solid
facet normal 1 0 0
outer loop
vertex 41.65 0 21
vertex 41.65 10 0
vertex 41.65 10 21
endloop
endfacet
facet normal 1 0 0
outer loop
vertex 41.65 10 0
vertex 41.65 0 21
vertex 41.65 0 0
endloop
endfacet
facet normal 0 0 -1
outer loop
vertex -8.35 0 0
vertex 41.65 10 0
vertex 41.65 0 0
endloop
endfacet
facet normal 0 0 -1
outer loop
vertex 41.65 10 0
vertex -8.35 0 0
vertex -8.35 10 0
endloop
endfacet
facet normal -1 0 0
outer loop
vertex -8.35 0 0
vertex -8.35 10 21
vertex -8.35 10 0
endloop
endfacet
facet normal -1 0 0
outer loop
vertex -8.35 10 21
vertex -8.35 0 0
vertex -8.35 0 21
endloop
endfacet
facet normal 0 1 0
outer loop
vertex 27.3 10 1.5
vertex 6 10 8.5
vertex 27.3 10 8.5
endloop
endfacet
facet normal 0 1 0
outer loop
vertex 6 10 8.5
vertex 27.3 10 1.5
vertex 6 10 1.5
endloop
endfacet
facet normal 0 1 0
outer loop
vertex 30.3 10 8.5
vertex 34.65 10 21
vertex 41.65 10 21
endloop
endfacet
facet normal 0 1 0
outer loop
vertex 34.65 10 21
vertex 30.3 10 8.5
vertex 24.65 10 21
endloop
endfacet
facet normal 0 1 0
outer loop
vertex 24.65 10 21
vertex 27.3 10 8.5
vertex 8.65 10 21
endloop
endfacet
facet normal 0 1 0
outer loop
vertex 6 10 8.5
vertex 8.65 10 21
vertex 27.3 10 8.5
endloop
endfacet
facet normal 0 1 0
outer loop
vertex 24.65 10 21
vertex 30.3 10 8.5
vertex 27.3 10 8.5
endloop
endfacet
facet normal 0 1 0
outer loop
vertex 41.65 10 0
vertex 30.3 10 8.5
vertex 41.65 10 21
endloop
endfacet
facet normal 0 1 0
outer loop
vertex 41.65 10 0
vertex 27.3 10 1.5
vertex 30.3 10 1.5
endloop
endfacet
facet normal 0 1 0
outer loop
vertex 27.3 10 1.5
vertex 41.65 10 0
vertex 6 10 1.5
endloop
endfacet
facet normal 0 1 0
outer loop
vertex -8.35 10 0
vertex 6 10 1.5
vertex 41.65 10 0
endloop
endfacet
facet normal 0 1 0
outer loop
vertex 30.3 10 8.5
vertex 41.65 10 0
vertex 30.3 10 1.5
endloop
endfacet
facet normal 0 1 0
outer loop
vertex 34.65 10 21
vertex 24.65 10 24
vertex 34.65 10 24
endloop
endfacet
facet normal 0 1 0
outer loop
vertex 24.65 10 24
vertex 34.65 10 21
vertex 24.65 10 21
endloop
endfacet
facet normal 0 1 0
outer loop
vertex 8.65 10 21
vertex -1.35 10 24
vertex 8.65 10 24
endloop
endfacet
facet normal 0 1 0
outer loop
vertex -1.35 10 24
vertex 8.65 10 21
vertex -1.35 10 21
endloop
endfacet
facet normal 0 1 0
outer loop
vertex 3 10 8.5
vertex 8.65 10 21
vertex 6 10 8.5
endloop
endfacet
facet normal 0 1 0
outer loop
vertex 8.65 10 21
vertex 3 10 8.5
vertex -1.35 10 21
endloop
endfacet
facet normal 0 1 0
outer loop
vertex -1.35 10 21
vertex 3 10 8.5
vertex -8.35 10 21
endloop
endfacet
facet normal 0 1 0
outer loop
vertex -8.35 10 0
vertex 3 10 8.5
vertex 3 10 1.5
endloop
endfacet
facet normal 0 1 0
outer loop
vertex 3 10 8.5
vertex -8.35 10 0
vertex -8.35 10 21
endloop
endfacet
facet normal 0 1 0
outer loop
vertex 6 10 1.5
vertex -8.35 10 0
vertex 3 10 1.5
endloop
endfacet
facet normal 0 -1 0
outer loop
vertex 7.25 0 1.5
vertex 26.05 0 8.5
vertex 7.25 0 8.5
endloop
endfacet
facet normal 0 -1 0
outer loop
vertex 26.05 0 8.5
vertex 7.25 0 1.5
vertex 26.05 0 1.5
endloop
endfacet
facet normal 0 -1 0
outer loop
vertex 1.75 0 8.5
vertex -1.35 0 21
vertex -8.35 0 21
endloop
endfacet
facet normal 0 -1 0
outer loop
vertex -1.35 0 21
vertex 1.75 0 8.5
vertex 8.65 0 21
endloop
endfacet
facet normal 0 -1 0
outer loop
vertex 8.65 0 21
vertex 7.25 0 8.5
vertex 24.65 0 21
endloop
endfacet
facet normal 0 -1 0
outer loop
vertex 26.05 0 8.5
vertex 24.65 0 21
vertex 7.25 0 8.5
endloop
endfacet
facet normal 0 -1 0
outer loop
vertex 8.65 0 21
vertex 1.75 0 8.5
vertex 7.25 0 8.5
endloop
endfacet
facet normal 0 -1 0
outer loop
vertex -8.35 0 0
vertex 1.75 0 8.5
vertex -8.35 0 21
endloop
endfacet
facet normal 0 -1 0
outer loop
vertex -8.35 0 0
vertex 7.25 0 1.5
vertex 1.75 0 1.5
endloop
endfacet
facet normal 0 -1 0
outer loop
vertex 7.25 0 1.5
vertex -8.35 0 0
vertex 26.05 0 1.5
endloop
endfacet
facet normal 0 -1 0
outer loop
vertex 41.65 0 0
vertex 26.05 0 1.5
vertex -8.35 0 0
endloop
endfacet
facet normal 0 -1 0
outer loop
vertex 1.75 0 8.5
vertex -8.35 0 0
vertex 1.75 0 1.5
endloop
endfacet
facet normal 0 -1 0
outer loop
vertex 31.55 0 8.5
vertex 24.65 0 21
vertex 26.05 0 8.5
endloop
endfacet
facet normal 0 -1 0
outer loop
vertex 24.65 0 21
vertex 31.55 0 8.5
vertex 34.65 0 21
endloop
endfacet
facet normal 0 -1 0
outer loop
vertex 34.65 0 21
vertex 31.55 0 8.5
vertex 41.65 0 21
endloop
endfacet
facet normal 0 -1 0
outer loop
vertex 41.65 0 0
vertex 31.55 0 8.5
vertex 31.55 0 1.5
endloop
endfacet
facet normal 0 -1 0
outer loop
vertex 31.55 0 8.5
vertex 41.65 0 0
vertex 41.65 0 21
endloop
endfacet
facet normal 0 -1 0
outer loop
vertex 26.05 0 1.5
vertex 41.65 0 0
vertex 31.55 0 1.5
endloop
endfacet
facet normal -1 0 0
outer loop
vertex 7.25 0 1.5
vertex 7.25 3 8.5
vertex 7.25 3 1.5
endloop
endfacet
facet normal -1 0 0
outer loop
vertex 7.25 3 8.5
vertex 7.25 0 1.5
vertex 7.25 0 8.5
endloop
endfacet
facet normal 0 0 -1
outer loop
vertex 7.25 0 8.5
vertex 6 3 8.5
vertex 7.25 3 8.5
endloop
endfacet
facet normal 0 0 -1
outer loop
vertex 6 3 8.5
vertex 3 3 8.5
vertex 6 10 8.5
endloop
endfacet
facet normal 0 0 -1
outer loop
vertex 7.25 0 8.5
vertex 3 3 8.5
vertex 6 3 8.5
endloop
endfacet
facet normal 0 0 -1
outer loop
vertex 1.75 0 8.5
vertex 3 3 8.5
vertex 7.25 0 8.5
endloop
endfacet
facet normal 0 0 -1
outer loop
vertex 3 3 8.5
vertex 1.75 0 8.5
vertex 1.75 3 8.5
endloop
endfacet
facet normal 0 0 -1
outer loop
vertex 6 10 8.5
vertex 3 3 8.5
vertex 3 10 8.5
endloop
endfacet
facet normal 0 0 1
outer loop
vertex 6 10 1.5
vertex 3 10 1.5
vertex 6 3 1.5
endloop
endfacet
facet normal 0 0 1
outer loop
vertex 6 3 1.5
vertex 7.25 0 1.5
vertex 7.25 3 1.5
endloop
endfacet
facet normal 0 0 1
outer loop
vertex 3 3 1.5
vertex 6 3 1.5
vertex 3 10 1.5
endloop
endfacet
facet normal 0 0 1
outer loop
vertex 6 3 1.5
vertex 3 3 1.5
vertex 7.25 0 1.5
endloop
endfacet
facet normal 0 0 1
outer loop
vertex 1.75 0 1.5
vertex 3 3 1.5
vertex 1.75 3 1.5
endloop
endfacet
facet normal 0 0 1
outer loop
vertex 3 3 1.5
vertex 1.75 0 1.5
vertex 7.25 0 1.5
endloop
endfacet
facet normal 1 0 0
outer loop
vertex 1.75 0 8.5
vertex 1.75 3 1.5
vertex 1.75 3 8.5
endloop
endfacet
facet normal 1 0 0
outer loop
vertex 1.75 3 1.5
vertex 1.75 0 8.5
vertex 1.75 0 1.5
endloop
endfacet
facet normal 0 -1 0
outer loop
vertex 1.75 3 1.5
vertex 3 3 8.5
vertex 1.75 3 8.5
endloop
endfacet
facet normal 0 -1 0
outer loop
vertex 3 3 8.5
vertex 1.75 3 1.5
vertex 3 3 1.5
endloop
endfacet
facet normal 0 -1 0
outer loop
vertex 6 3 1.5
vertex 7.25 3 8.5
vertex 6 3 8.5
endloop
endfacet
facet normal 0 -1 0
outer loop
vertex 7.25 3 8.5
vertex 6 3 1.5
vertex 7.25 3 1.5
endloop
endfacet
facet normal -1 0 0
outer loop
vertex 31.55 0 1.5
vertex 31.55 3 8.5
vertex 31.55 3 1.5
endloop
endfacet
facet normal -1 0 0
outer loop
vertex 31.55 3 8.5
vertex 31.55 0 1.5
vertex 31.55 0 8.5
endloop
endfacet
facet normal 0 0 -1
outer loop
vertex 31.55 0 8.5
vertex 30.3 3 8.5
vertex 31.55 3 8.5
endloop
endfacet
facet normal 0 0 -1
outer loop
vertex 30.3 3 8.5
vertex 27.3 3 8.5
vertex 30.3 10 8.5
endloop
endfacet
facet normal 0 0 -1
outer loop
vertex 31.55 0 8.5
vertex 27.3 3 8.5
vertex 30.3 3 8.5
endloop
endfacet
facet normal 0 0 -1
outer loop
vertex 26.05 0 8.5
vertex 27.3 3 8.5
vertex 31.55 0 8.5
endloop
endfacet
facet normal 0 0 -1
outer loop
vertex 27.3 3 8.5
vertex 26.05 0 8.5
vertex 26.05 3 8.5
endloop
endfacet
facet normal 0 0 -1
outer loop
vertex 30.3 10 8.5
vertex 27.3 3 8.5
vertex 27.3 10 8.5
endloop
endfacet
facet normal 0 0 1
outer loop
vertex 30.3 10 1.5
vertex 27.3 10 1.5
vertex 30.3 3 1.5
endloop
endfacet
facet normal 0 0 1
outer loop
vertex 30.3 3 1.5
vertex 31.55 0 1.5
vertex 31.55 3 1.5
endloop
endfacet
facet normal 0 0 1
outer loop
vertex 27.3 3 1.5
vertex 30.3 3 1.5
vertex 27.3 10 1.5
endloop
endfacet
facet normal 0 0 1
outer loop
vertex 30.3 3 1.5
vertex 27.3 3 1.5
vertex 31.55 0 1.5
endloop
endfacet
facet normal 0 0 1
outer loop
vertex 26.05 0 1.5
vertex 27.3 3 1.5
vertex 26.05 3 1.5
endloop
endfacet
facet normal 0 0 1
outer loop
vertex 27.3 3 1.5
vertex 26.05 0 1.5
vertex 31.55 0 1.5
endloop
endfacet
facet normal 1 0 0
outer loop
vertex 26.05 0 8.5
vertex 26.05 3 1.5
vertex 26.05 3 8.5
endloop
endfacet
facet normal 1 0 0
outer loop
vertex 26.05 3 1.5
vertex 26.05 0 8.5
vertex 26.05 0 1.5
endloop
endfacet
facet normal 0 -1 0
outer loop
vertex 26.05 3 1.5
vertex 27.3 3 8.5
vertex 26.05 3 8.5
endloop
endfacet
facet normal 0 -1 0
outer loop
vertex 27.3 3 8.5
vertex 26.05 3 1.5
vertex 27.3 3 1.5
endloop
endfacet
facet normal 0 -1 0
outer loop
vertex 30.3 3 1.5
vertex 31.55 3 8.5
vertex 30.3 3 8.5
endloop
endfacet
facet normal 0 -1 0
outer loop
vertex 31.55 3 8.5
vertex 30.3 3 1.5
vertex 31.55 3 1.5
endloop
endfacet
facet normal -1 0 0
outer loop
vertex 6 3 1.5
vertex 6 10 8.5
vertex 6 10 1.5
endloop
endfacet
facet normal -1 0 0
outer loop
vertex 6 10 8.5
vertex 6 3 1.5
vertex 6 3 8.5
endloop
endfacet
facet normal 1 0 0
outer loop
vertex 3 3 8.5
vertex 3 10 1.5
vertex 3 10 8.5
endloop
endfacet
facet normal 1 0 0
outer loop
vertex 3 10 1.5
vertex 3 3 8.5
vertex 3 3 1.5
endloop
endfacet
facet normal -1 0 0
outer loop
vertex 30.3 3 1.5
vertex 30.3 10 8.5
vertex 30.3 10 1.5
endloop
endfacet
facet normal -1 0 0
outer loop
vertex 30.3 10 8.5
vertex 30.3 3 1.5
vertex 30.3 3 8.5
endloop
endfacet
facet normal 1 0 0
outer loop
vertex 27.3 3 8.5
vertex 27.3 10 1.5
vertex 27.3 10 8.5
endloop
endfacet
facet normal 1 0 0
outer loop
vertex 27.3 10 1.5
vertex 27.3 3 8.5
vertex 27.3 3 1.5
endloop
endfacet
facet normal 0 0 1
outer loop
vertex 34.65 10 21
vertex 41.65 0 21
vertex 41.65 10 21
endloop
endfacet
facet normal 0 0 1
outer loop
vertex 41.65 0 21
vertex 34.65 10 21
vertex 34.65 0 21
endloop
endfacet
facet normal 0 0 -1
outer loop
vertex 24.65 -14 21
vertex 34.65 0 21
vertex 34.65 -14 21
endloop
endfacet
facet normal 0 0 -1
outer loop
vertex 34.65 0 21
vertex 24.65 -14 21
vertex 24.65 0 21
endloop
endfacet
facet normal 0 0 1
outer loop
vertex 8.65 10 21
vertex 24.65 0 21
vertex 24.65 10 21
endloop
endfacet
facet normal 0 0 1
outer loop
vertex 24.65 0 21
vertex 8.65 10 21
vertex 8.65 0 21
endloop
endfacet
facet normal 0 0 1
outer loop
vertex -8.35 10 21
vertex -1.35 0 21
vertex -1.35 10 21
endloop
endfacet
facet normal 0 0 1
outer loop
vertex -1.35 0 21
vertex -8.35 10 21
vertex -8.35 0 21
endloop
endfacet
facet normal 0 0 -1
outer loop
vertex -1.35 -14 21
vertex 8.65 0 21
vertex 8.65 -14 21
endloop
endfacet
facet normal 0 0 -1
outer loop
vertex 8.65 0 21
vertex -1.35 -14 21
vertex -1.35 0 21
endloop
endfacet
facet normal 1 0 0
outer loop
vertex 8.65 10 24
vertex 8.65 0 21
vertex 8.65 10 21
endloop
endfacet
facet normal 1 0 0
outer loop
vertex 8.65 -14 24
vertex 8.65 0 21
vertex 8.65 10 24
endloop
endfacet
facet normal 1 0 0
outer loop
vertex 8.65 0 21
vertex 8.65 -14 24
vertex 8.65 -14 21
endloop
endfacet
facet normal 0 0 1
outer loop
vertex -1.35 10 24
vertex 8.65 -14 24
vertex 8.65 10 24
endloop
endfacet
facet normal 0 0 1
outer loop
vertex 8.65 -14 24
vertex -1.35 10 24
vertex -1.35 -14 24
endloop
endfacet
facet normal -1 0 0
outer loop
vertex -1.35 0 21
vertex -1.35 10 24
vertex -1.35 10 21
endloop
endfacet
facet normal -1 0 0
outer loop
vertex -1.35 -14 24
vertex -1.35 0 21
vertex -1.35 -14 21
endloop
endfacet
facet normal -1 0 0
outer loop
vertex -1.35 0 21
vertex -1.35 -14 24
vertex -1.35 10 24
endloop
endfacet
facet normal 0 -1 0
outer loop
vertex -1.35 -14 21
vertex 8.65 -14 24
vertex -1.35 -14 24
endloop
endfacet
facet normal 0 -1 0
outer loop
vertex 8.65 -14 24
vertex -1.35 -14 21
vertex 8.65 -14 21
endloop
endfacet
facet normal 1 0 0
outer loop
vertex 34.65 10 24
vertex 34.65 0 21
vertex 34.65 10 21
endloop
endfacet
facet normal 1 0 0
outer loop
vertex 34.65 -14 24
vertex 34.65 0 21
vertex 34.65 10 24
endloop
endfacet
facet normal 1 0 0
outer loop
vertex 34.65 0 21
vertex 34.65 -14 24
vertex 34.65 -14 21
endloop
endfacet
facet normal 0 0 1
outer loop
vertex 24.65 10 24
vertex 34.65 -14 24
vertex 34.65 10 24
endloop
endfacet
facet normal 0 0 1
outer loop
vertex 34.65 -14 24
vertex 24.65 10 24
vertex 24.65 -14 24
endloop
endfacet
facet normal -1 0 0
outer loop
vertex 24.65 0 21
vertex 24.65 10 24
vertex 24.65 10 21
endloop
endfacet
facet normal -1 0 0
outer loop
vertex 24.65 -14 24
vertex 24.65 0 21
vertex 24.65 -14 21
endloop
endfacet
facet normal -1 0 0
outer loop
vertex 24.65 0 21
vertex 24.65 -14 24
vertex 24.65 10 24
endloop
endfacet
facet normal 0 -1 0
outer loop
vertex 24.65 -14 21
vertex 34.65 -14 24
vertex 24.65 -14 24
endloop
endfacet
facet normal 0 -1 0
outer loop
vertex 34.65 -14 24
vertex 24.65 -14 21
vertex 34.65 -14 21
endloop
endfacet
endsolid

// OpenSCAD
//difference()
//{
//  translate([16.5, 2.5, 10.5])
//  roundedRect([33, 5, 21], 0);
//    
//  translate([16.5, 2.5, 10.5])
//  roundedRect([31, 3, 25], 1);
//}
//
module roundedRect(size, radius)  // more elegant version
 linear_extrude(height = size.z, center=true)
  offset(radius) offset(-radius)
   square([size.x, size.y], center = true);

difference()
{
    translate([-8.35,0,0])
    cube([50,10,10]);

    translate([1.75,0,1.5])
    cube([5.5,3,7]);
    
    translate([26.05,0,1.5])
    cube([5.5,3,7]);
    
    translate([3,3,1.5])
    cube([3,7,7]);
    
    translate([27.3,3,1.5])
    cube([3,7,7]);
}

translate([-8.35,0,10])
cube([50,10,11]);

translate([-1.35,-14,21])
cube([10,24,3]);

translate([24.65,-14,21])
cube([10,24,3]);
